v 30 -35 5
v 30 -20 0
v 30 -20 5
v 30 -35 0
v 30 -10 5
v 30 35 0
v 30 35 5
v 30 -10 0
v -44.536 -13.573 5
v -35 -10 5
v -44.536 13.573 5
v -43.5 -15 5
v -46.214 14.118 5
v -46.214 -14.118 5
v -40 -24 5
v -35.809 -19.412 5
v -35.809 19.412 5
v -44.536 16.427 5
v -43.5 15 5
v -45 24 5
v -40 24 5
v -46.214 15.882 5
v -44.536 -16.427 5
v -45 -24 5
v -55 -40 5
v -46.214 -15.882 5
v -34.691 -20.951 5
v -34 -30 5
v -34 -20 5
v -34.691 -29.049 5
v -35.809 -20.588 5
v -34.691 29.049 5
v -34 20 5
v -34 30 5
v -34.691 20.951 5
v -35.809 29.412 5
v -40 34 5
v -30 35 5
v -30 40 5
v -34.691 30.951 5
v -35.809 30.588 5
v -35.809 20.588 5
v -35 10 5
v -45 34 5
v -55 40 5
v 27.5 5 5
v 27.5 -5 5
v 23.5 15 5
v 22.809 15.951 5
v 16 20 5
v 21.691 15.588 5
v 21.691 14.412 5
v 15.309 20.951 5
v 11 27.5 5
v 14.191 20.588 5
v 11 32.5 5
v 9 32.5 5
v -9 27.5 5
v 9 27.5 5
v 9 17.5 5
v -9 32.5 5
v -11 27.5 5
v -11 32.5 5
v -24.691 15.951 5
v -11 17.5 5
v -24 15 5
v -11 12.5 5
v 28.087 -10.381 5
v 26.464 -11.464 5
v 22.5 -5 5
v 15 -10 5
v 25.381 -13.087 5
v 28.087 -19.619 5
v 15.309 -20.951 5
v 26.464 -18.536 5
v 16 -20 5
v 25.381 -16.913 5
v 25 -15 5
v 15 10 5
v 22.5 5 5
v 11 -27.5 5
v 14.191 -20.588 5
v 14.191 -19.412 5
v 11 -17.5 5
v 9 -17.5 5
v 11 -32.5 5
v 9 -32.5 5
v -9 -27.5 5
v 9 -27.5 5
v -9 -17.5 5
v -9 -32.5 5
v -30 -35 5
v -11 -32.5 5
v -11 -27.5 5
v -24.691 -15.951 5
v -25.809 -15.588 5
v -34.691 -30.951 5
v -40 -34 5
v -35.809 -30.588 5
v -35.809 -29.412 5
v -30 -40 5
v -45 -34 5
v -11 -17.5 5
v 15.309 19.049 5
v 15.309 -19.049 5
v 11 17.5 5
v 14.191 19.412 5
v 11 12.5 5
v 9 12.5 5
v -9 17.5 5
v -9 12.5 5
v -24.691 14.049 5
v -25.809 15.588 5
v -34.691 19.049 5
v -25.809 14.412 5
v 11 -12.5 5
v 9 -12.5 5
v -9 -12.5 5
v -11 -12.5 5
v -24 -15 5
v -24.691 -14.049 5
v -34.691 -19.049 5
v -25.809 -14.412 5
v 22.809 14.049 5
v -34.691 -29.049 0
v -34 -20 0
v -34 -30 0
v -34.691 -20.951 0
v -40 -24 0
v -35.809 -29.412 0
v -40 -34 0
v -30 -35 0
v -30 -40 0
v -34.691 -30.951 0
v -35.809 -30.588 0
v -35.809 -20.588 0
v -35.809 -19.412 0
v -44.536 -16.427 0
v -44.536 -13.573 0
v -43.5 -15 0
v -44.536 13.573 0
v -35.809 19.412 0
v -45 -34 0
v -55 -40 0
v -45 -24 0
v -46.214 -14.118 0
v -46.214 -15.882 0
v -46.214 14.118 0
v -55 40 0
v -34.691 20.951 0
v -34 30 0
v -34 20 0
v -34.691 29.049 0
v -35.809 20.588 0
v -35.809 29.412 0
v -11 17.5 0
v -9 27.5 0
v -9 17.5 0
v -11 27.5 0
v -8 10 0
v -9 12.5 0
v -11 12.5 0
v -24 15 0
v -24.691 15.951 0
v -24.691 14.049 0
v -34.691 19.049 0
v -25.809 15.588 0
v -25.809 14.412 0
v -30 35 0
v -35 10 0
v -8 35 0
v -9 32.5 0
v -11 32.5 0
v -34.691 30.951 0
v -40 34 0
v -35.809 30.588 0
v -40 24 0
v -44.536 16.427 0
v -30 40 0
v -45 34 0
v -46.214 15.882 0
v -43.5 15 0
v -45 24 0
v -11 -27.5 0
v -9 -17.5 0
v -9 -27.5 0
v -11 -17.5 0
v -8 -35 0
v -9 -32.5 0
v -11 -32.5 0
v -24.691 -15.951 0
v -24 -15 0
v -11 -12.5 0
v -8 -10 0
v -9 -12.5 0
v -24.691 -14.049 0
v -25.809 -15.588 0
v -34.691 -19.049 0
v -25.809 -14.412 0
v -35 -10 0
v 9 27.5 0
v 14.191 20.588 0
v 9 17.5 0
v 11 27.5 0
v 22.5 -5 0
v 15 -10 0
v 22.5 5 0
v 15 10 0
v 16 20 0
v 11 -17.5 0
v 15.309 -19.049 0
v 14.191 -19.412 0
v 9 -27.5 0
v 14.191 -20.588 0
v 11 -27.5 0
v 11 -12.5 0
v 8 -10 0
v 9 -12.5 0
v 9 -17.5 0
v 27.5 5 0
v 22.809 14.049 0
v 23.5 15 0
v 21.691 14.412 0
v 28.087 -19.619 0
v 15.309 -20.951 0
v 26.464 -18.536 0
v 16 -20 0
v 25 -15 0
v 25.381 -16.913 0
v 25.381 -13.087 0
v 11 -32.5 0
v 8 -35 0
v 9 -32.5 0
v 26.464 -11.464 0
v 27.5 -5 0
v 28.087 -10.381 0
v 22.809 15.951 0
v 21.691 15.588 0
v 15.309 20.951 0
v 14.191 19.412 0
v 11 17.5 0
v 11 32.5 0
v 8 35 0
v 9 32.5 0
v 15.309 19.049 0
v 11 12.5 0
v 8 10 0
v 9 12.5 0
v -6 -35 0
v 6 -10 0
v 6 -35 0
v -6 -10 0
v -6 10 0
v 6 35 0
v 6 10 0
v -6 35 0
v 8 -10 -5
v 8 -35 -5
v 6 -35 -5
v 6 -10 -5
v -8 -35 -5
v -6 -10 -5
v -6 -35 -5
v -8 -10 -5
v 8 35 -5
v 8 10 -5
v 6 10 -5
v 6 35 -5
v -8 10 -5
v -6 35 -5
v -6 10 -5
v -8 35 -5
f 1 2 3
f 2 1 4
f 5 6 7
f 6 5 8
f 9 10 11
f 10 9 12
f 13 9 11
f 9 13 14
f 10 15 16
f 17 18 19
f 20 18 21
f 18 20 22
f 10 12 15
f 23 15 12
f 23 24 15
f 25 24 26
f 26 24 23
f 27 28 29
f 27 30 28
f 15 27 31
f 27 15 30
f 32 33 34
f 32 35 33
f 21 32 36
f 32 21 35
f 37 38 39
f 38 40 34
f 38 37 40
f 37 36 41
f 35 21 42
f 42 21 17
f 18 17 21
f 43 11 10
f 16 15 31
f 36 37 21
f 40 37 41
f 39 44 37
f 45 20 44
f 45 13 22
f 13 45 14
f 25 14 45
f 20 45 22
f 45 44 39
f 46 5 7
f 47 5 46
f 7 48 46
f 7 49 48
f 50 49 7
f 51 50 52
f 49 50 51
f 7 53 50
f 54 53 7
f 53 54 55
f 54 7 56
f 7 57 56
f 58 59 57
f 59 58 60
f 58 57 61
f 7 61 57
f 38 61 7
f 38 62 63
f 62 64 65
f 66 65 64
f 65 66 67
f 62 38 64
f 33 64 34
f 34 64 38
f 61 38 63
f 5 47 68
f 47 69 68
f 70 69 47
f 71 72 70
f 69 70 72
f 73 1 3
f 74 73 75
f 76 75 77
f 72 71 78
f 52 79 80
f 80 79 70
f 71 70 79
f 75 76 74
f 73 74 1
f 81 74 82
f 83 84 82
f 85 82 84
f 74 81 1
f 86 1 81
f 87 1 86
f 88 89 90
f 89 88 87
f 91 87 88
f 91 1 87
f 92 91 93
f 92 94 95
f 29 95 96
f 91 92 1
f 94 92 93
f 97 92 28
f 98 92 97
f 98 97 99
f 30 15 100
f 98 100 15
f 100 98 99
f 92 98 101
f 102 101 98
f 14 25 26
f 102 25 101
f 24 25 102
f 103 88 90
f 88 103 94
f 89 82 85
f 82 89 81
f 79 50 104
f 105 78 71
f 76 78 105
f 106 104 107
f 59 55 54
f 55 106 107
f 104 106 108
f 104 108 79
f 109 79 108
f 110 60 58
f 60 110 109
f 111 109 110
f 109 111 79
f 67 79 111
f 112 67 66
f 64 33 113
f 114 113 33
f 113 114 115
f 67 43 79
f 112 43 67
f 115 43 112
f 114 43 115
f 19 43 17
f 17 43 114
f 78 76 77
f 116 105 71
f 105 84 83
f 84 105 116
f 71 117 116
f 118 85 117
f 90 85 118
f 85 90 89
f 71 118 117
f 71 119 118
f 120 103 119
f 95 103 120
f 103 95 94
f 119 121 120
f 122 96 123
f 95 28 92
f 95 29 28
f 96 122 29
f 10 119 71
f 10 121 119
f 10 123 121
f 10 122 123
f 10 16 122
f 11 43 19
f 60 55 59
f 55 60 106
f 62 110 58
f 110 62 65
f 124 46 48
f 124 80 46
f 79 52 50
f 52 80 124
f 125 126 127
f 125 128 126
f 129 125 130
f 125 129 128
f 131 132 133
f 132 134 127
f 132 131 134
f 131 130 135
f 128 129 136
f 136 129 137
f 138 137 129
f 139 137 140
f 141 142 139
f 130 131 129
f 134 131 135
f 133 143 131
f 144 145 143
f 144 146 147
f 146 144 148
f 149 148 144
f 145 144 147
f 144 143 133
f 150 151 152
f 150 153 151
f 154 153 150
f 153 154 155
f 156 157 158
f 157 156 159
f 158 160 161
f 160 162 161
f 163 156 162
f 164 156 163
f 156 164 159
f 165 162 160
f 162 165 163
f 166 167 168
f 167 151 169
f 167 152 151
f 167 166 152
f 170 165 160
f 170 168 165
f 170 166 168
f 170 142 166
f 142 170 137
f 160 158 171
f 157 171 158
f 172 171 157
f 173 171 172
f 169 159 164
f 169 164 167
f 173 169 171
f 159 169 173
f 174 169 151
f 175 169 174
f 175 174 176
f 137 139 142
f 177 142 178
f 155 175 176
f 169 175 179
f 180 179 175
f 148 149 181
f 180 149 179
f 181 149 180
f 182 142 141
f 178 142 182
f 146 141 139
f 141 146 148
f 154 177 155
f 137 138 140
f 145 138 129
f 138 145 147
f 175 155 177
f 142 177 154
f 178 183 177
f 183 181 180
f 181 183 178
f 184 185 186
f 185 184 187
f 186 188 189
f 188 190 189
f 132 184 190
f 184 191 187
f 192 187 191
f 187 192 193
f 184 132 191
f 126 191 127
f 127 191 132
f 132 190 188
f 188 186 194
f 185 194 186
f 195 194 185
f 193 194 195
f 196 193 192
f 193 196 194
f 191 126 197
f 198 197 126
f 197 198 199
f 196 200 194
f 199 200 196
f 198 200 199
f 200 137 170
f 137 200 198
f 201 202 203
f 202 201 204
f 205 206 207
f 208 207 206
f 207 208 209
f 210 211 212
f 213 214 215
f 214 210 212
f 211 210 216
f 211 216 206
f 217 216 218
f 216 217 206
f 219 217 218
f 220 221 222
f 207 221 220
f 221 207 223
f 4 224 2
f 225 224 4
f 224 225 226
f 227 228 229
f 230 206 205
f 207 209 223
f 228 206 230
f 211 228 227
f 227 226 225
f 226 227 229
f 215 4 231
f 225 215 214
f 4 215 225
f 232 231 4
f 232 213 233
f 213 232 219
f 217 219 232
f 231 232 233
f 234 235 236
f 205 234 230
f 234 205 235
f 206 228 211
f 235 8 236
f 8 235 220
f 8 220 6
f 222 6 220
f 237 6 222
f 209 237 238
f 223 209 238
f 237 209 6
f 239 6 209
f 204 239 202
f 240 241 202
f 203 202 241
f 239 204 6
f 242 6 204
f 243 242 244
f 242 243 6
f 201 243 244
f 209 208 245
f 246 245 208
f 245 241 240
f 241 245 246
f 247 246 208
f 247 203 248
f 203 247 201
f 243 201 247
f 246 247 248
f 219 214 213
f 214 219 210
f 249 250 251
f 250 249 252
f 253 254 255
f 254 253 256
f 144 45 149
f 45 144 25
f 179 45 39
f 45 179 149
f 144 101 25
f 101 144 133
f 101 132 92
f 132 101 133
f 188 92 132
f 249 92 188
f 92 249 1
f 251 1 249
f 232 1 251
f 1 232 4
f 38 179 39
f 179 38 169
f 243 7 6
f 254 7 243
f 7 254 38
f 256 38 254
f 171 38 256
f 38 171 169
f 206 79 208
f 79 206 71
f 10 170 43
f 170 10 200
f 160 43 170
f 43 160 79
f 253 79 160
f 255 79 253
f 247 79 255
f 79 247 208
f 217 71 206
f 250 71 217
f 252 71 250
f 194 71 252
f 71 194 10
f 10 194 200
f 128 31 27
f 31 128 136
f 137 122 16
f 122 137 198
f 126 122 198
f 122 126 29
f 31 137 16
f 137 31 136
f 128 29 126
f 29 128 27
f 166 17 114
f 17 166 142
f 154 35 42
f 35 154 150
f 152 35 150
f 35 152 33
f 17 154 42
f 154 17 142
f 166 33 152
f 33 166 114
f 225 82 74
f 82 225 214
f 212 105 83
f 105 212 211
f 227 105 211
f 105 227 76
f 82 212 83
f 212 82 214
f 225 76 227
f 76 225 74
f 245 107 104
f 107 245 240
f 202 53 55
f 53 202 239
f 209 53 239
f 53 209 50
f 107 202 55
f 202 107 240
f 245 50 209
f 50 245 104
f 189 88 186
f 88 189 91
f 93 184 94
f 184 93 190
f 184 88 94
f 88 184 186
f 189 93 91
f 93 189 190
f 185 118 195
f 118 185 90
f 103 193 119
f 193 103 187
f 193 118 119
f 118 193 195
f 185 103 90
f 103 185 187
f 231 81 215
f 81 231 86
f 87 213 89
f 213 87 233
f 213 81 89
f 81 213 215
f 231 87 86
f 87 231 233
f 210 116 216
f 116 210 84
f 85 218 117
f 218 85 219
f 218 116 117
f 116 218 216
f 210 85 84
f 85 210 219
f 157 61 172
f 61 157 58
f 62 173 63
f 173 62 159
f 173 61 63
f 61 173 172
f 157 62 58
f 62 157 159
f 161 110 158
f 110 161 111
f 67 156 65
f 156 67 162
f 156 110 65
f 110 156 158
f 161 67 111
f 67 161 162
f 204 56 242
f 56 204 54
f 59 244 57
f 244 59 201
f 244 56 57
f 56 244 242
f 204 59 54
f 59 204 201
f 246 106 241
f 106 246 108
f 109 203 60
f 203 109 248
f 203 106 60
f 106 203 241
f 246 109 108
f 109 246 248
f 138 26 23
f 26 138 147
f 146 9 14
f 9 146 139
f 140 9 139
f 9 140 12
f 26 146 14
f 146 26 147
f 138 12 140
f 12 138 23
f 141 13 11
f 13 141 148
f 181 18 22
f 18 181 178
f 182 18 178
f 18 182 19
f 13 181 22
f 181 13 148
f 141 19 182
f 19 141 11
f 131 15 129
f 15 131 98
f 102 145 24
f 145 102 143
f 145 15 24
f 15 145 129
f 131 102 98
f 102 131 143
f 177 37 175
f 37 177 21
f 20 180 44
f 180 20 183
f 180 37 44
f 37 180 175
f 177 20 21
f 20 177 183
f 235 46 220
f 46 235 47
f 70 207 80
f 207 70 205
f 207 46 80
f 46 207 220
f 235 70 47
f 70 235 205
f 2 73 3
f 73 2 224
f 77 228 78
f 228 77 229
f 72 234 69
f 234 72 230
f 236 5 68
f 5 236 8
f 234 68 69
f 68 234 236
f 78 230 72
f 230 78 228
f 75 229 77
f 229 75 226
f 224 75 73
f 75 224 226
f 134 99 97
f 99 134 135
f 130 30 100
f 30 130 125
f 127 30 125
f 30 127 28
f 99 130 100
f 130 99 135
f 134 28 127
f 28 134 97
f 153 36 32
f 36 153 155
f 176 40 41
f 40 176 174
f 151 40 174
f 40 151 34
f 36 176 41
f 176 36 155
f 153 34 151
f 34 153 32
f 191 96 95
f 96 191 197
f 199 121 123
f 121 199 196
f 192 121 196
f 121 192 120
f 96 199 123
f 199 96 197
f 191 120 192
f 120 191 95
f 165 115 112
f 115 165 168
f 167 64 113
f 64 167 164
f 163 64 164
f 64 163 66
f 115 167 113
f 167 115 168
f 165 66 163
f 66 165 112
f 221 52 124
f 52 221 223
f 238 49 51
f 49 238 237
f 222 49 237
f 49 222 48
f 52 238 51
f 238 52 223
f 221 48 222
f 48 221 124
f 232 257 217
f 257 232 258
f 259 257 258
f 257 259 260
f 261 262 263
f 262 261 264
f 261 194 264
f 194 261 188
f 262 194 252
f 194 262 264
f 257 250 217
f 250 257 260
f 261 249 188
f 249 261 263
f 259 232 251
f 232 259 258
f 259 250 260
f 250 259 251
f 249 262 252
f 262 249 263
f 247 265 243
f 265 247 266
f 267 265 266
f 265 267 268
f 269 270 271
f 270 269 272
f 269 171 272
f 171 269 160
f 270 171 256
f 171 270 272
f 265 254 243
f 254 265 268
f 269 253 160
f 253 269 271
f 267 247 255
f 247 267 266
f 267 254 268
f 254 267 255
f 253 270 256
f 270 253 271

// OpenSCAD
// file: librairie.scad
module Base_Chassis(h)
{
    difference()
    {
        // Base Chassis
        translate([-55, -40, 0]) cube([85, 80, h]);
    
        // Passage Roues
        translate([0, -37.5, 2.5]) cube([60, 5, h], true);
        translate([0,  37.5, 2.5]) cube([60, 5, h], true);
    }   
}    

module Pass_Tirap(pos_x, pos_y, pos_z)
{
    translate([pos_x, pos_y, pos_z]) cube([2, 5, 5], true);
}    

module Pass_Vis(pos_x, pos_y, pos_z, h)
{
    translate([pos_x, pos_y, pos_z]) cylinder(h = h, r = 1);
}

module TCRT5K(pos_x, pos_y, pos_z)
{
    translate([pos_x, pos_y, pos_z]) cube([5, 10, 5], true);
}
// main file
include <librairie.scad>;

module Fix_Pelle()
{
    cylinder(h = 5, r = 1.5);
}

module Support_MOT()
{
    difference()
    {
        cube([16, 25, 5], true);
        cube([12, 25, 5], true);
    }    
}    

module Chassis()
{
    union()
    {
        difference()
        {
            Base_Chassis(5);
    
            // Evidement
            translate([-35, -10, 0]) cube([50, 20, 5]);
    
            // Support PCB 
            Pass_Vis(-35, -20, 0, 5);
            Pass_Vis(-35,  20, 0, 5);
            Pass_Vis( 15, -20, 0, 5);
            Pass_Vis( 15,  20, 0, 5);
    
            // Attache MOT G
            Pass_Tirap(-10, -30, 2.5);
            Pass_Tirap(-10, -15, 2.5);
            Pass_Tirap( 10, -30, 2.5);
            Pass_Tirap( 10, -15, 2.5);
    
            // Attache MOT D
            Pass_Tirap(-10,  30, 2.5);
            Pass_Tirap(-10,  15, 2.5);
            Pass_Tirap( 10,  30, 2.5);
            Pass_Tirap( 10,  15, 2.5);
    
            // Attache Pelle
            translate([-45, -15, 0]) Fix_Pelle();
            translate([-45,  15, 0]) Fix_Pelle();
    
            // Passage Capteurs TCRT
            //rotate(a = [0, 0,  15]) 
            TCRT5K(-42.5, -29, 2.5);
            //rotate(a = [0, 0, -15]) 
            TCRT5K(-42.5,  29, 2.5);
            TCRT5K( 25,   0, 2.5);
    
            // Passage Batterie
            translate([30, -15, 0]) cylinder(h = 5, r = 5);
        
            // Vis assemblage
            Pass_Vis(-35, -30, 0, 5);
            Pass_Vis(-35,  30, 0, 5);
            Pass_Vis(-25, -15, 0, 5);
            Pass_Vis(-25,  15, 0, 5);
            Pass_Vis( 22.5, 15, 0, 5);
        }    

        translate([0, -22.5, -2.5]) Support_MOT();
        translate([0,  22.5, -2.5]) Support_MOT();
    }
}

Chassis();
